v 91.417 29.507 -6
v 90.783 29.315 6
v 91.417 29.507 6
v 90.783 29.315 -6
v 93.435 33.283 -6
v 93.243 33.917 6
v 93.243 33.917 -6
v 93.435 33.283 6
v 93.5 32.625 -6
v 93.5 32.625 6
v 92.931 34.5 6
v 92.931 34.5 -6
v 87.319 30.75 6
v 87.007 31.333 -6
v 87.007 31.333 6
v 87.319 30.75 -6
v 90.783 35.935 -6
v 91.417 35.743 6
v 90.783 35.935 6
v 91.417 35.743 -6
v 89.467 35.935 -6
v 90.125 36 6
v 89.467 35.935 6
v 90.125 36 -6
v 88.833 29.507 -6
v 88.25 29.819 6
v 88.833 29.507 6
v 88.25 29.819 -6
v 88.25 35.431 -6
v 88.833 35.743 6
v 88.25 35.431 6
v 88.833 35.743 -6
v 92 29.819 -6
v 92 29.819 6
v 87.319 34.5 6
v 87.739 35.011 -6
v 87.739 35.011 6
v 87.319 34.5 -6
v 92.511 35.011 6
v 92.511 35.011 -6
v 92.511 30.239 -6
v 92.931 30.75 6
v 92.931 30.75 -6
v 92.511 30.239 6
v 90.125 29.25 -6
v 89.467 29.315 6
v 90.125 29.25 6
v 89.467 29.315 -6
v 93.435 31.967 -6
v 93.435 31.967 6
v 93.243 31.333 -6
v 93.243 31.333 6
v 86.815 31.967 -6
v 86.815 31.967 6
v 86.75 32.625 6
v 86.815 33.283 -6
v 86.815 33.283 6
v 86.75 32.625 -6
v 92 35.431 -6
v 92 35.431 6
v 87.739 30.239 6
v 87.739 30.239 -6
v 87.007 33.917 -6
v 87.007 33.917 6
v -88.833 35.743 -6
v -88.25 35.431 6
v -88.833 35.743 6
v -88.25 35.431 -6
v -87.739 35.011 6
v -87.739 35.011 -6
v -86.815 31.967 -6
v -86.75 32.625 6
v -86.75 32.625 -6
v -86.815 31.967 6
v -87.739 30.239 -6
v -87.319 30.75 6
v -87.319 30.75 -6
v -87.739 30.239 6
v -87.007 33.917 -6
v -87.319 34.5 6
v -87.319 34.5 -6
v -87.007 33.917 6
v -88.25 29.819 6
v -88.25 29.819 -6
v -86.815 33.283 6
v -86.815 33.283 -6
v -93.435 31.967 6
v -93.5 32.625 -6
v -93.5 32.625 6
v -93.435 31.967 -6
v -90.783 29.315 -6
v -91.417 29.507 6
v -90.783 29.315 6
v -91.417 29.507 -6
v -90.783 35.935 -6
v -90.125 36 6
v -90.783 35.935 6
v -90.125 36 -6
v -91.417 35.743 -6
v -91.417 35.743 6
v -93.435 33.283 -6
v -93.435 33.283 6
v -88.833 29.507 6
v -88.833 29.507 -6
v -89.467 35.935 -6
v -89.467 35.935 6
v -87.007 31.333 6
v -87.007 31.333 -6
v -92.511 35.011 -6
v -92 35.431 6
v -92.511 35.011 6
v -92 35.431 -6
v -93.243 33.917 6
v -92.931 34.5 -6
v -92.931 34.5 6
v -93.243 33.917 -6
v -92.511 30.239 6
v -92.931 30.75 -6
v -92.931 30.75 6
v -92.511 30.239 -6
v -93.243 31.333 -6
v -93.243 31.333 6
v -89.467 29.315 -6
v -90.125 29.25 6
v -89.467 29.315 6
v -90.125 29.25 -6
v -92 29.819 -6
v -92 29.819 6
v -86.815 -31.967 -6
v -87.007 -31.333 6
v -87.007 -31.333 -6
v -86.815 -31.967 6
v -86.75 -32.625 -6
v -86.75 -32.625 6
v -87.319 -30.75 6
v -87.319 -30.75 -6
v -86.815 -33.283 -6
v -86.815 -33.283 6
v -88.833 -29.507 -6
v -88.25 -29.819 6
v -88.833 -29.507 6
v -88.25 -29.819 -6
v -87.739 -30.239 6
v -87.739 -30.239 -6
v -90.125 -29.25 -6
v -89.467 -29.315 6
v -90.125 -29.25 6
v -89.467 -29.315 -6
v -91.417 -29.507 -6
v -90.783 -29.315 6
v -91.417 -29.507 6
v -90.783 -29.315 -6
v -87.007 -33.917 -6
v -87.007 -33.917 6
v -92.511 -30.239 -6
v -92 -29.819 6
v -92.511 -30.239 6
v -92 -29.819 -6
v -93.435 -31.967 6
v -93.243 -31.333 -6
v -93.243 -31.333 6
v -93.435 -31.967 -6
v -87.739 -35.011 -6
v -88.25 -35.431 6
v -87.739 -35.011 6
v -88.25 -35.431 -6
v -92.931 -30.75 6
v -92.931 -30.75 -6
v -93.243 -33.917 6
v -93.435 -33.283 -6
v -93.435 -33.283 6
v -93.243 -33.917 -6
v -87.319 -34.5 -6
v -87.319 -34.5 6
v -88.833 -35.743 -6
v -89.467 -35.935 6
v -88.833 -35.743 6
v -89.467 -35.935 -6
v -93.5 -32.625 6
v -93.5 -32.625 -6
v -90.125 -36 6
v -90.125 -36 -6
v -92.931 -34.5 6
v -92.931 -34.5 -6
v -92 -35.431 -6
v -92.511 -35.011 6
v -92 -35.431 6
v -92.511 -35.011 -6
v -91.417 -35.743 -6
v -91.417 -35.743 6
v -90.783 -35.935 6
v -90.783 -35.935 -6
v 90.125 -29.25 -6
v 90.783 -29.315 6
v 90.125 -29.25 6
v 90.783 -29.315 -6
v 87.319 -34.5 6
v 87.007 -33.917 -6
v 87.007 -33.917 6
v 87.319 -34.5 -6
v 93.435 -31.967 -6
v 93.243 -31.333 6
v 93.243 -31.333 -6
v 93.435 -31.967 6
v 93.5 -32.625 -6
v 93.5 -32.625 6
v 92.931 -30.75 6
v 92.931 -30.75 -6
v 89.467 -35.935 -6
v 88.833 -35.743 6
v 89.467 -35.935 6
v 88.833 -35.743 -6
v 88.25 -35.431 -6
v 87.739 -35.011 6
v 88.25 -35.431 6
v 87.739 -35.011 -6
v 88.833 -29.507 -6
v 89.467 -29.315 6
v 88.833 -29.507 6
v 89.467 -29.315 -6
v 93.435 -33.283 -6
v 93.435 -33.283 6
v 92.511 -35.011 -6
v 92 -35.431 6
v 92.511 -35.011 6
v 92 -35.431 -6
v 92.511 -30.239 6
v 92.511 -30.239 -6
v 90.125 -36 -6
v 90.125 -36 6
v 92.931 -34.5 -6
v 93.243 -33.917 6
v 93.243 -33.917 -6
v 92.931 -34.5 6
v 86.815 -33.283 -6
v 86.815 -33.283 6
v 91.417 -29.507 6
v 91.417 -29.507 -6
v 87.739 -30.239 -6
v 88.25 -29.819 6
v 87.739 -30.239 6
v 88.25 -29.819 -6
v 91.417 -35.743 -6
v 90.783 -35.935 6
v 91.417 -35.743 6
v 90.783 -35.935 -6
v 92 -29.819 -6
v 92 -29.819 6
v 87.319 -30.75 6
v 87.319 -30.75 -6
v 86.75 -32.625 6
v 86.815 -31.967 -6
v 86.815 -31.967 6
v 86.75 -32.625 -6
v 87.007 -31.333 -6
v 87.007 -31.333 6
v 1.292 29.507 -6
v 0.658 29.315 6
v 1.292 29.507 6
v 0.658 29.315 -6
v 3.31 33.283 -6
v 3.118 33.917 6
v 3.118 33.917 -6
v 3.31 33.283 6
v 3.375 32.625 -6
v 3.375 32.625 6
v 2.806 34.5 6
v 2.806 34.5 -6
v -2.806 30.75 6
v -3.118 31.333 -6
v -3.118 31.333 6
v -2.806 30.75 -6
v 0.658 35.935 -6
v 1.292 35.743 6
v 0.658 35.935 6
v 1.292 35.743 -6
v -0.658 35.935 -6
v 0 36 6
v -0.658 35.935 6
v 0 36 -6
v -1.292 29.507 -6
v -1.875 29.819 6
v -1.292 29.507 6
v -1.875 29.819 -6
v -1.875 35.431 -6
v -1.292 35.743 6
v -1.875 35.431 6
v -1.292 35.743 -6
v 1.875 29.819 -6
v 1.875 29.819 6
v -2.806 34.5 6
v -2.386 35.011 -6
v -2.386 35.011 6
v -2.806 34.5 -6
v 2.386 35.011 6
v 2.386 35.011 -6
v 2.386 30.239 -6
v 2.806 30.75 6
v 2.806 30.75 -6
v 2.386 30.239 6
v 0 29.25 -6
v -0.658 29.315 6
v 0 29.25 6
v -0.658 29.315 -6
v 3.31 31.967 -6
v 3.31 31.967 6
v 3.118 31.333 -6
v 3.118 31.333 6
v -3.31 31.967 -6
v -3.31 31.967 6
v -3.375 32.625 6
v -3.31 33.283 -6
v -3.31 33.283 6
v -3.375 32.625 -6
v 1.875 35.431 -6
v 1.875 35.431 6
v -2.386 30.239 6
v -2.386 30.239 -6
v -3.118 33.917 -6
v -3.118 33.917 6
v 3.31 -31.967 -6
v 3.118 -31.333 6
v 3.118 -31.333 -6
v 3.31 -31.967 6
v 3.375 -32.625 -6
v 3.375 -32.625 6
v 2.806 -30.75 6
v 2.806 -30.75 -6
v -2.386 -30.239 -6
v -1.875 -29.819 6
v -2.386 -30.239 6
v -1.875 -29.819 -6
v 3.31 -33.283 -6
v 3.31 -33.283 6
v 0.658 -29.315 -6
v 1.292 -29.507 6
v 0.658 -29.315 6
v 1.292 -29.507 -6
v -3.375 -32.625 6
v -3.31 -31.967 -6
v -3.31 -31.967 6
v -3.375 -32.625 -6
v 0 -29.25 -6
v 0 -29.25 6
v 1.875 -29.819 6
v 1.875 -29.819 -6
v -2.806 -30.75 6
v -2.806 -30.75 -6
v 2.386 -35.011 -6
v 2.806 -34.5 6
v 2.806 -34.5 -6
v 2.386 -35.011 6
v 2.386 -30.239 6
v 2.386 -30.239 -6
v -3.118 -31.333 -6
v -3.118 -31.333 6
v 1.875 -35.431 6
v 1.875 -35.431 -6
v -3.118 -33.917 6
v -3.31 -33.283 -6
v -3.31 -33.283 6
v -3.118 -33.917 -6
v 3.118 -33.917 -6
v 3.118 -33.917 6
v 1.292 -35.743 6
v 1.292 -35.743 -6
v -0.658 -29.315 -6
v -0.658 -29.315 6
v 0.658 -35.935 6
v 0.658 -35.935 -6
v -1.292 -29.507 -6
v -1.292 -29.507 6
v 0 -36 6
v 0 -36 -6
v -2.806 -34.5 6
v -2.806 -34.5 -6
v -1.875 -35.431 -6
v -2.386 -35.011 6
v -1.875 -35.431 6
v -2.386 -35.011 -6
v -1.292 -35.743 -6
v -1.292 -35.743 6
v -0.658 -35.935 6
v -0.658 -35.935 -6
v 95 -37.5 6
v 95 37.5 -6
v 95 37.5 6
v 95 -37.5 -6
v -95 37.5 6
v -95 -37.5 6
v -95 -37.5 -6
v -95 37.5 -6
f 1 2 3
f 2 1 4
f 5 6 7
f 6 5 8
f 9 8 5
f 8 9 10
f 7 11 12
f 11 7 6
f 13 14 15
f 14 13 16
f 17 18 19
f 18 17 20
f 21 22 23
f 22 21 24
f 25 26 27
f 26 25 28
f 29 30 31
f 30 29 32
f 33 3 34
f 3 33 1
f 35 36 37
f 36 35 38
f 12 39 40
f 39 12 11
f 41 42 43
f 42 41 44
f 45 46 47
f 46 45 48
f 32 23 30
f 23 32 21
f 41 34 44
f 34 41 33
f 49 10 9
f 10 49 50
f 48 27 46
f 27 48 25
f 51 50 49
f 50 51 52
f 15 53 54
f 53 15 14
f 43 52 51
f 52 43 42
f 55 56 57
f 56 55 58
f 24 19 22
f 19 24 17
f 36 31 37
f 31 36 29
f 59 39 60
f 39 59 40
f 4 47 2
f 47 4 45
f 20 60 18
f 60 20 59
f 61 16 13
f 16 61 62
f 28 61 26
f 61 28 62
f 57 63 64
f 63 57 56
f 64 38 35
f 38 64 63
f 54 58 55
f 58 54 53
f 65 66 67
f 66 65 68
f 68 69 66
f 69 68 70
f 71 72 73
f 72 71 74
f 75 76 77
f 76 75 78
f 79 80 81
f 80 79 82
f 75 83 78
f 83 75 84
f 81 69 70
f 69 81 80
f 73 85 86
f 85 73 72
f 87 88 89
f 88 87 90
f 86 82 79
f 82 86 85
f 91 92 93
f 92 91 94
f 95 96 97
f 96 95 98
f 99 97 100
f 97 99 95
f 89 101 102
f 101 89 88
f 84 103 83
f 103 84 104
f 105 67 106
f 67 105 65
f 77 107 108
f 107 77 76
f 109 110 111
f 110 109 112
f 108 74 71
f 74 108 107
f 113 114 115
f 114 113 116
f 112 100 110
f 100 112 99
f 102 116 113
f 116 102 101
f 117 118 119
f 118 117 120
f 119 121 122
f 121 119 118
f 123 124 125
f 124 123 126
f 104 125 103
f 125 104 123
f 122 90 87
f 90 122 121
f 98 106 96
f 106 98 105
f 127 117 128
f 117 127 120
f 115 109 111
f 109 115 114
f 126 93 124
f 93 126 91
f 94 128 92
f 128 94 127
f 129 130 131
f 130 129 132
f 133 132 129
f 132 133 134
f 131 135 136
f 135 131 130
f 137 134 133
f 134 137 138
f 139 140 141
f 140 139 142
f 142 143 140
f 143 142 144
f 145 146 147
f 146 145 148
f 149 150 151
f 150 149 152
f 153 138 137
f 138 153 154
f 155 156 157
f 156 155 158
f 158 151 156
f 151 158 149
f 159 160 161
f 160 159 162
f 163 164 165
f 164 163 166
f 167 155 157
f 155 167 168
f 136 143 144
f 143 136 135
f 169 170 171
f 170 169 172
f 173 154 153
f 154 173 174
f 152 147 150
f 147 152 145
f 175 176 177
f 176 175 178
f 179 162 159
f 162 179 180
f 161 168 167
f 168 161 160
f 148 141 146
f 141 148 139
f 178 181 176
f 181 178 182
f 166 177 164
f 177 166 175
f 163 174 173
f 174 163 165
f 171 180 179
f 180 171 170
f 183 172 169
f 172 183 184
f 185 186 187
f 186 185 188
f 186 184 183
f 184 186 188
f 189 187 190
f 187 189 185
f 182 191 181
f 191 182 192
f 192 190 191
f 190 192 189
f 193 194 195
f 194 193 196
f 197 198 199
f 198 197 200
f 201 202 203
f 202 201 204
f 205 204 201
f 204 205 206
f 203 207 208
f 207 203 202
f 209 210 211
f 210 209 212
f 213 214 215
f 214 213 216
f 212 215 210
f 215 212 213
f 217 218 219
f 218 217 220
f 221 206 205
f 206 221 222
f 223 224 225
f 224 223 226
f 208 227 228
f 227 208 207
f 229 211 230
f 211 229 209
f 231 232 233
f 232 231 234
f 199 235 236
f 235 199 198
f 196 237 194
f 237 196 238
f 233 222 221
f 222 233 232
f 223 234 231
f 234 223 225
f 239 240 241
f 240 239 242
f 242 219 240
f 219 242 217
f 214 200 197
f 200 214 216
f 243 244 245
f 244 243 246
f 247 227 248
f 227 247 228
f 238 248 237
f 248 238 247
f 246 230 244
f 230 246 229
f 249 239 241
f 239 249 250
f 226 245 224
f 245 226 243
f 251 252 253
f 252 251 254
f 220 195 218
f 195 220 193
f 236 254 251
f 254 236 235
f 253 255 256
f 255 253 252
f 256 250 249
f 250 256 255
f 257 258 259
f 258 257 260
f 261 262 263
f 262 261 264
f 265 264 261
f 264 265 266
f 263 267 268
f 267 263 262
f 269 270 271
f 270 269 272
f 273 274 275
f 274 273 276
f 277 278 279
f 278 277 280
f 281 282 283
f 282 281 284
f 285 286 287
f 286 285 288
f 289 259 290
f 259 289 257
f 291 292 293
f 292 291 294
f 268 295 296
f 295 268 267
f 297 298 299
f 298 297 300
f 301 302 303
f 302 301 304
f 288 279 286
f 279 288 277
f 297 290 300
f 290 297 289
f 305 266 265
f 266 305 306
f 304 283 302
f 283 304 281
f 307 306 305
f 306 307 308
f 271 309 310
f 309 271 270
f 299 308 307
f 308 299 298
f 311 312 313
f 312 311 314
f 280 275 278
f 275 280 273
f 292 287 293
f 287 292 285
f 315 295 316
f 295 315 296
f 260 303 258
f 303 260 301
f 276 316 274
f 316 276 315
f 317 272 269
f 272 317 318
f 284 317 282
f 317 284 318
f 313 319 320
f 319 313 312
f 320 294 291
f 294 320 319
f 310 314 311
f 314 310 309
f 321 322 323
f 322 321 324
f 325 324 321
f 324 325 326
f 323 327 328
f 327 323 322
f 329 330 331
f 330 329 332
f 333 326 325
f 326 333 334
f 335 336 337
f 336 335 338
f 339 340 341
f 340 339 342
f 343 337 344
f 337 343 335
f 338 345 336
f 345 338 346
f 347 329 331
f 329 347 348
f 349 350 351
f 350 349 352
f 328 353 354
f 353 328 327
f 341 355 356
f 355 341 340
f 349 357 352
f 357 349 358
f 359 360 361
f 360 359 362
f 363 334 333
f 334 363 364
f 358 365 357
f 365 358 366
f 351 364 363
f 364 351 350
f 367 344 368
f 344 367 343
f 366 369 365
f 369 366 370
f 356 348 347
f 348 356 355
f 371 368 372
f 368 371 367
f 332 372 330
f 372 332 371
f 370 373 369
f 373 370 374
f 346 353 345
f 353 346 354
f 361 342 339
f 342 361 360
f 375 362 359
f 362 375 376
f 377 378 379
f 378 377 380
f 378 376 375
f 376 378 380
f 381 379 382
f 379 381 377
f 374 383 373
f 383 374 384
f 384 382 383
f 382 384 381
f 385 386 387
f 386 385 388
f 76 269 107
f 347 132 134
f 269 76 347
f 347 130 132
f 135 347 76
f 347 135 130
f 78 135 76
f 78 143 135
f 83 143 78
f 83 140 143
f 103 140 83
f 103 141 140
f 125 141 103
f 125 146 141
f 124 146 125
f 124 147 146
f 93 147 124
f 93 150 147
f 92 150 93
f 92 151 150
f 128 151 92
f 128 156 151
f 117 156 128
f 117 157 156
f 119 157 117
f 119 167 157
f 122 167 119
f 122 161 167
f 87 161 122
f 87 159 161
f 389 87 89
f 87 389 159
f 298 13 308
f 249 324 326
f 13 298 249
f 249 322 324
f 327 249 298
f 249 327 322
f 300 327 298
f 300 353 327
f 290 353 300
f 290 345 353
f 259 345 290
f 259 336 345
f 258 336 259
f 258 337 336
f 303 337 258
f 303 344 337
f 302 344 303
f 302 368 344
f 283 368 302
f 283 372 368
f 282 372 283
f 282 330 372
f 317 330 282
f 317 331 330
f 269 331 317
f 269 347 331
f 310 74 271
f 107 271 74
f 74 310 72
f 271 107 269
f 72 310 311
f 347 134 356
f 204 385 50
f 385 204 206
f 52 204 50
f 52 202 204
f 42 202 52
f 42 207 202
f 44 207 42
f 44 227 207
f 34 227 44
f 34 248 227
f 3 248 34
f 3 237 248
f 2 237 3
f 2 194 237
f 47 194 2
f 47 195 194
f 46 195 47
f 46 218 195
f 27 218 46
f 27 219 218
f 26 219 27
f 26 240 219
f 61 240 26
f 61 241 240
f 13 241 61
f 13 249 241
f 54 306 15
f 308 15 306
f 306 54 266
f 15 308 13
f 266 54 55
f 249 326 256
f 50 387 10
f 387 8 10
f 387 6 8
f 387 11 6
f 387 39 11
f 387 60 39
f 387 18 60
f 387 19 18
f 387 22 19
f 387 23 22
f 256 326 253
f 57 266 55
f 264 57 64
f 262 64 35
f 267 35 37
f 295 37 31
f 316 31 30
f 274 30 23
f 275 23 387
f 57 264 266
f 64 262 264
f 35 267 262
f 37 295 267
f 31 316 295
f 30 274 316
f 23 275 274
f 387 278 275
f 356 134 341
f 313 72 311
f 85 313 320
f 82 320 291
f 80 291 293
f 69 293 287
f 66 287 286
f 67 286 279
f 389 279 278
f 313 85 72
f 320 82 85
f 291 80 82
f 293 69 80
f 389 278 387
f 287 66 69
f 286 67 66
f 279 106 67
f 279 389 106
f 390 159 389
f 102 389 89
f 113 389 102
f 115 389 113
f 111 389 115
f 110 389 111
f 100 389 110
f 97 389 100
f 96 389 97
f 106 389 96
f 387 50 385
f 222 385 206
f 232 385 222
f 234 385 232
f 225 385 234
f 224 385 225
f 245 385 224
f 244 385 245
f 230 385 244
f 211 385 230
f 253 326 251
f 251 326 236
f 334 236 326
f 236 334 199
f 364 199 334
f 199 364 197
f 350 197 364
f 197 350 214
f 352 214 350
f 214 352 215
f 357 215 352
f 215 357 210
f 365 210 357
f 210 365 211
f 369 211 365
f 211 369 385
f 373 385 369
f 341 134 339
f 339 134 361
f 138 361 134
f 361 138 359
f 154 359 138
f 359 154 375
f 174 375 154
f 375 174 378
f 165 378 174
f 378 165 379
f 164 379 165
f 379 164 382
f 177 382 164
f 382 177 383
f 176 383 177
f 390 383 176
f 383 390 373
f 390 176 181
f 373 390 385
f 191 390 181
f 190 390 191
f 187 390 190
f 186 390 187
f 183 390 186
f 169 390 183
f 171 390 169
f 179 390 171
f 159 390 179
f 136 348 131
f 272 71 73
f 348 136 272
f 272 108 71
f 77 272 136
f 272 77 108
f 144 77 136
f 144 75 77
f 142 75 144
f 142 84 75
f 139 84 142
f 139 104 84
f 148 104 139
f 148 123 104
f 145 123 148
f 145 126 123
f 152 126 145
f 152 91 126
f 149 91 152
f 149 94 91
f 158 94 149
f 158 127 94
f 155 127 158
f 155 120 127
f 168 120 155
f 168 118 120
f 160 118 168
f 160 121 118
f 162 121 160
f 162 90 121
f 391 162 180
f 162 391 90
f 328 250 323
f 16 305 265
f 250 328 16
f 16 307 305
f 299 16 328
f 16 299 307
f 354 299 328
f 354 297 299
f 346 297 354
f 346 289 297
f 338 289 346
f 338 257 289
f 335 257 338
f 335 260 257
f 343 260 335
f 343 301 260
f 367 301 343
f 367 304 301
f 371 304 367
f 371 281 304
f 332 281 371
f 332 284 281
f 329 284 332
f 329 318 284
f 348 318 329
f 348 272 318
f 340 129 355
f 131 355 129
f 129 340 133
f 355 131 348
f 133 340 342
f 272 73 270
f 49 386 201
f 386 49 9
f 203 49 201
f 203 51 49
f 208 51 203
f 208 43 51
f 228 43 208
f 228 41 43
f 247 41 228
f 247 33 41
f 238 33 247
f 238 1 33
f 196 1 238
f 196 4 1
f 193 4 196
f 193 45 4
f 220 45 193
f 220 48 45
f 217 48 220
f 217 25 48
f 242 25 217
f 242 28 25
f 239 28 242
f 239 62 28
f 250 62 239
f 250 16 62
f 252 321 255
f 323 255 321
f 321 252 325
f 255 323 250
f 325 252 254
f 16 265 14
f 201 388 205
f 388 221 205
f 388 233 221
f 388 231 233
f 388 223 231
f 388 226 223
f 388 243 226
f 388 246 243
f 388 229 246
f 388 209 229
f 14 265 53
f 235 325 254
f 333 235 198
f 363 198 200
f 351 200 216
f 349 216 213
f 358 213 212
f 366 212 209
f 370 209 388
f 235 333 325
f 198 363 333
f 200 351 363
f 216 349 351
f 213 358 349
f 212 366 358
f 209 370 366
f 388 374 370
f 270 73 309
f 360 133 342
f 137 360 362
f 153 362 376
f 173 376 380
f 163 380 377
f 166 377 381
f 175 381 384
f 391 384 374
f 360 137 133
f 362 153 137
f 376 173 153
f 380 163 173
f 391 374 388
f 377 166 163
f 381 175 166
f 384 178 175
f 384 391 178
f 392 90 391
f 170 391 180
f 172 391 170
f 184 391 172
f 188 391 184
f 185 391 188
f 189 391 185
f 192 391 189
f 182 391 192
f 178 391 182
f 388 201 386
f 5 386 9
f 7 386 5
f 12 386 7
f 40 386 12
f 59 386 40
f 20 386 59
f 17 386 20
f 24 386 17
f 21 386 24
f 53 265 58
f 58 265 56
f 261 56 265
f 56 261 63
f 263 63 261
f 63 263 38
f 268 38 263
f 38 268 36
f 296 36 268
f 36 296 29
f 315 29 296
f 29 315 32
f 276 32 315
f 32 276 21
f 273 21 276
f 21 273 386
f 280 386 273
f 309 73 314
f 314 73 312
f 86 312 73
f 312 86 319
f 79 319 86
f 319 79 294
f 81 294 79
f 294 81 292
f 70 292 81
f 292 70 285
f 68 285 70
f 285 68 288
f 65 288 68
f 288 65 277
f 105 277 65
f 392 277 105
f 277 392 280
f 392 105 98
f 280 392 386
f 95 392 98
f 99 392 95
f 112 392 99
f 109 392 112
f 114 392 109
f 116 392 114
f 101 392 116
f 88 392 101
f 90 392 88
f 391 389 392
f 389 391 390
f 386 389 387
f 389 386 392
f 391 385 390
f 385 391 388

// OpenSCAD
$fn = 32;

// ----------------------------------------------------------------------
// Corner plate 190 x 75 x 12
// 6 holes, centres taken from the edge offset
// ----------------------------------------------------------------------

// --- parameters (mm) ---
plate = [190, 75, 12];   // overall size (x, y, z)
holes = 6;               // number of holes the drawing asks for
bore_d = 6.6;            // nominal hole diameter from the drawing
print_allowance = 0.15;  // clearance added for printing
edge = 4.875;            // hole centre offset from the plate edge

// --- derived feature positions (mm) ---
hole_d = bore_d + print_allowance;  // = 6.75   hole diameter as printed
corner_x = plate[0] / 2 - edge;     // = 90.12   corner hole X
corner_y = plate[1] / 2 - edge;     // = 32.62   corner hole Y
feature_centers = [
  [corner_x, corner_y],
  [-corner_x, corner_y],
  [-corner_x, -corner_y],
  [corner_x, -corner_y],
  [0, corner_y],
  [0, -corner_y]
];   // hole centres the loop below drills

// plate outline, every hole drilled through with the same cutters
difference() {
  cube(plate, center = true);
  for (centre = feature_centers)
    translate([centre[0], centre[1], 0])
      cylinder(d = hole_d, h = plate[2] + 2, center = true);
}
